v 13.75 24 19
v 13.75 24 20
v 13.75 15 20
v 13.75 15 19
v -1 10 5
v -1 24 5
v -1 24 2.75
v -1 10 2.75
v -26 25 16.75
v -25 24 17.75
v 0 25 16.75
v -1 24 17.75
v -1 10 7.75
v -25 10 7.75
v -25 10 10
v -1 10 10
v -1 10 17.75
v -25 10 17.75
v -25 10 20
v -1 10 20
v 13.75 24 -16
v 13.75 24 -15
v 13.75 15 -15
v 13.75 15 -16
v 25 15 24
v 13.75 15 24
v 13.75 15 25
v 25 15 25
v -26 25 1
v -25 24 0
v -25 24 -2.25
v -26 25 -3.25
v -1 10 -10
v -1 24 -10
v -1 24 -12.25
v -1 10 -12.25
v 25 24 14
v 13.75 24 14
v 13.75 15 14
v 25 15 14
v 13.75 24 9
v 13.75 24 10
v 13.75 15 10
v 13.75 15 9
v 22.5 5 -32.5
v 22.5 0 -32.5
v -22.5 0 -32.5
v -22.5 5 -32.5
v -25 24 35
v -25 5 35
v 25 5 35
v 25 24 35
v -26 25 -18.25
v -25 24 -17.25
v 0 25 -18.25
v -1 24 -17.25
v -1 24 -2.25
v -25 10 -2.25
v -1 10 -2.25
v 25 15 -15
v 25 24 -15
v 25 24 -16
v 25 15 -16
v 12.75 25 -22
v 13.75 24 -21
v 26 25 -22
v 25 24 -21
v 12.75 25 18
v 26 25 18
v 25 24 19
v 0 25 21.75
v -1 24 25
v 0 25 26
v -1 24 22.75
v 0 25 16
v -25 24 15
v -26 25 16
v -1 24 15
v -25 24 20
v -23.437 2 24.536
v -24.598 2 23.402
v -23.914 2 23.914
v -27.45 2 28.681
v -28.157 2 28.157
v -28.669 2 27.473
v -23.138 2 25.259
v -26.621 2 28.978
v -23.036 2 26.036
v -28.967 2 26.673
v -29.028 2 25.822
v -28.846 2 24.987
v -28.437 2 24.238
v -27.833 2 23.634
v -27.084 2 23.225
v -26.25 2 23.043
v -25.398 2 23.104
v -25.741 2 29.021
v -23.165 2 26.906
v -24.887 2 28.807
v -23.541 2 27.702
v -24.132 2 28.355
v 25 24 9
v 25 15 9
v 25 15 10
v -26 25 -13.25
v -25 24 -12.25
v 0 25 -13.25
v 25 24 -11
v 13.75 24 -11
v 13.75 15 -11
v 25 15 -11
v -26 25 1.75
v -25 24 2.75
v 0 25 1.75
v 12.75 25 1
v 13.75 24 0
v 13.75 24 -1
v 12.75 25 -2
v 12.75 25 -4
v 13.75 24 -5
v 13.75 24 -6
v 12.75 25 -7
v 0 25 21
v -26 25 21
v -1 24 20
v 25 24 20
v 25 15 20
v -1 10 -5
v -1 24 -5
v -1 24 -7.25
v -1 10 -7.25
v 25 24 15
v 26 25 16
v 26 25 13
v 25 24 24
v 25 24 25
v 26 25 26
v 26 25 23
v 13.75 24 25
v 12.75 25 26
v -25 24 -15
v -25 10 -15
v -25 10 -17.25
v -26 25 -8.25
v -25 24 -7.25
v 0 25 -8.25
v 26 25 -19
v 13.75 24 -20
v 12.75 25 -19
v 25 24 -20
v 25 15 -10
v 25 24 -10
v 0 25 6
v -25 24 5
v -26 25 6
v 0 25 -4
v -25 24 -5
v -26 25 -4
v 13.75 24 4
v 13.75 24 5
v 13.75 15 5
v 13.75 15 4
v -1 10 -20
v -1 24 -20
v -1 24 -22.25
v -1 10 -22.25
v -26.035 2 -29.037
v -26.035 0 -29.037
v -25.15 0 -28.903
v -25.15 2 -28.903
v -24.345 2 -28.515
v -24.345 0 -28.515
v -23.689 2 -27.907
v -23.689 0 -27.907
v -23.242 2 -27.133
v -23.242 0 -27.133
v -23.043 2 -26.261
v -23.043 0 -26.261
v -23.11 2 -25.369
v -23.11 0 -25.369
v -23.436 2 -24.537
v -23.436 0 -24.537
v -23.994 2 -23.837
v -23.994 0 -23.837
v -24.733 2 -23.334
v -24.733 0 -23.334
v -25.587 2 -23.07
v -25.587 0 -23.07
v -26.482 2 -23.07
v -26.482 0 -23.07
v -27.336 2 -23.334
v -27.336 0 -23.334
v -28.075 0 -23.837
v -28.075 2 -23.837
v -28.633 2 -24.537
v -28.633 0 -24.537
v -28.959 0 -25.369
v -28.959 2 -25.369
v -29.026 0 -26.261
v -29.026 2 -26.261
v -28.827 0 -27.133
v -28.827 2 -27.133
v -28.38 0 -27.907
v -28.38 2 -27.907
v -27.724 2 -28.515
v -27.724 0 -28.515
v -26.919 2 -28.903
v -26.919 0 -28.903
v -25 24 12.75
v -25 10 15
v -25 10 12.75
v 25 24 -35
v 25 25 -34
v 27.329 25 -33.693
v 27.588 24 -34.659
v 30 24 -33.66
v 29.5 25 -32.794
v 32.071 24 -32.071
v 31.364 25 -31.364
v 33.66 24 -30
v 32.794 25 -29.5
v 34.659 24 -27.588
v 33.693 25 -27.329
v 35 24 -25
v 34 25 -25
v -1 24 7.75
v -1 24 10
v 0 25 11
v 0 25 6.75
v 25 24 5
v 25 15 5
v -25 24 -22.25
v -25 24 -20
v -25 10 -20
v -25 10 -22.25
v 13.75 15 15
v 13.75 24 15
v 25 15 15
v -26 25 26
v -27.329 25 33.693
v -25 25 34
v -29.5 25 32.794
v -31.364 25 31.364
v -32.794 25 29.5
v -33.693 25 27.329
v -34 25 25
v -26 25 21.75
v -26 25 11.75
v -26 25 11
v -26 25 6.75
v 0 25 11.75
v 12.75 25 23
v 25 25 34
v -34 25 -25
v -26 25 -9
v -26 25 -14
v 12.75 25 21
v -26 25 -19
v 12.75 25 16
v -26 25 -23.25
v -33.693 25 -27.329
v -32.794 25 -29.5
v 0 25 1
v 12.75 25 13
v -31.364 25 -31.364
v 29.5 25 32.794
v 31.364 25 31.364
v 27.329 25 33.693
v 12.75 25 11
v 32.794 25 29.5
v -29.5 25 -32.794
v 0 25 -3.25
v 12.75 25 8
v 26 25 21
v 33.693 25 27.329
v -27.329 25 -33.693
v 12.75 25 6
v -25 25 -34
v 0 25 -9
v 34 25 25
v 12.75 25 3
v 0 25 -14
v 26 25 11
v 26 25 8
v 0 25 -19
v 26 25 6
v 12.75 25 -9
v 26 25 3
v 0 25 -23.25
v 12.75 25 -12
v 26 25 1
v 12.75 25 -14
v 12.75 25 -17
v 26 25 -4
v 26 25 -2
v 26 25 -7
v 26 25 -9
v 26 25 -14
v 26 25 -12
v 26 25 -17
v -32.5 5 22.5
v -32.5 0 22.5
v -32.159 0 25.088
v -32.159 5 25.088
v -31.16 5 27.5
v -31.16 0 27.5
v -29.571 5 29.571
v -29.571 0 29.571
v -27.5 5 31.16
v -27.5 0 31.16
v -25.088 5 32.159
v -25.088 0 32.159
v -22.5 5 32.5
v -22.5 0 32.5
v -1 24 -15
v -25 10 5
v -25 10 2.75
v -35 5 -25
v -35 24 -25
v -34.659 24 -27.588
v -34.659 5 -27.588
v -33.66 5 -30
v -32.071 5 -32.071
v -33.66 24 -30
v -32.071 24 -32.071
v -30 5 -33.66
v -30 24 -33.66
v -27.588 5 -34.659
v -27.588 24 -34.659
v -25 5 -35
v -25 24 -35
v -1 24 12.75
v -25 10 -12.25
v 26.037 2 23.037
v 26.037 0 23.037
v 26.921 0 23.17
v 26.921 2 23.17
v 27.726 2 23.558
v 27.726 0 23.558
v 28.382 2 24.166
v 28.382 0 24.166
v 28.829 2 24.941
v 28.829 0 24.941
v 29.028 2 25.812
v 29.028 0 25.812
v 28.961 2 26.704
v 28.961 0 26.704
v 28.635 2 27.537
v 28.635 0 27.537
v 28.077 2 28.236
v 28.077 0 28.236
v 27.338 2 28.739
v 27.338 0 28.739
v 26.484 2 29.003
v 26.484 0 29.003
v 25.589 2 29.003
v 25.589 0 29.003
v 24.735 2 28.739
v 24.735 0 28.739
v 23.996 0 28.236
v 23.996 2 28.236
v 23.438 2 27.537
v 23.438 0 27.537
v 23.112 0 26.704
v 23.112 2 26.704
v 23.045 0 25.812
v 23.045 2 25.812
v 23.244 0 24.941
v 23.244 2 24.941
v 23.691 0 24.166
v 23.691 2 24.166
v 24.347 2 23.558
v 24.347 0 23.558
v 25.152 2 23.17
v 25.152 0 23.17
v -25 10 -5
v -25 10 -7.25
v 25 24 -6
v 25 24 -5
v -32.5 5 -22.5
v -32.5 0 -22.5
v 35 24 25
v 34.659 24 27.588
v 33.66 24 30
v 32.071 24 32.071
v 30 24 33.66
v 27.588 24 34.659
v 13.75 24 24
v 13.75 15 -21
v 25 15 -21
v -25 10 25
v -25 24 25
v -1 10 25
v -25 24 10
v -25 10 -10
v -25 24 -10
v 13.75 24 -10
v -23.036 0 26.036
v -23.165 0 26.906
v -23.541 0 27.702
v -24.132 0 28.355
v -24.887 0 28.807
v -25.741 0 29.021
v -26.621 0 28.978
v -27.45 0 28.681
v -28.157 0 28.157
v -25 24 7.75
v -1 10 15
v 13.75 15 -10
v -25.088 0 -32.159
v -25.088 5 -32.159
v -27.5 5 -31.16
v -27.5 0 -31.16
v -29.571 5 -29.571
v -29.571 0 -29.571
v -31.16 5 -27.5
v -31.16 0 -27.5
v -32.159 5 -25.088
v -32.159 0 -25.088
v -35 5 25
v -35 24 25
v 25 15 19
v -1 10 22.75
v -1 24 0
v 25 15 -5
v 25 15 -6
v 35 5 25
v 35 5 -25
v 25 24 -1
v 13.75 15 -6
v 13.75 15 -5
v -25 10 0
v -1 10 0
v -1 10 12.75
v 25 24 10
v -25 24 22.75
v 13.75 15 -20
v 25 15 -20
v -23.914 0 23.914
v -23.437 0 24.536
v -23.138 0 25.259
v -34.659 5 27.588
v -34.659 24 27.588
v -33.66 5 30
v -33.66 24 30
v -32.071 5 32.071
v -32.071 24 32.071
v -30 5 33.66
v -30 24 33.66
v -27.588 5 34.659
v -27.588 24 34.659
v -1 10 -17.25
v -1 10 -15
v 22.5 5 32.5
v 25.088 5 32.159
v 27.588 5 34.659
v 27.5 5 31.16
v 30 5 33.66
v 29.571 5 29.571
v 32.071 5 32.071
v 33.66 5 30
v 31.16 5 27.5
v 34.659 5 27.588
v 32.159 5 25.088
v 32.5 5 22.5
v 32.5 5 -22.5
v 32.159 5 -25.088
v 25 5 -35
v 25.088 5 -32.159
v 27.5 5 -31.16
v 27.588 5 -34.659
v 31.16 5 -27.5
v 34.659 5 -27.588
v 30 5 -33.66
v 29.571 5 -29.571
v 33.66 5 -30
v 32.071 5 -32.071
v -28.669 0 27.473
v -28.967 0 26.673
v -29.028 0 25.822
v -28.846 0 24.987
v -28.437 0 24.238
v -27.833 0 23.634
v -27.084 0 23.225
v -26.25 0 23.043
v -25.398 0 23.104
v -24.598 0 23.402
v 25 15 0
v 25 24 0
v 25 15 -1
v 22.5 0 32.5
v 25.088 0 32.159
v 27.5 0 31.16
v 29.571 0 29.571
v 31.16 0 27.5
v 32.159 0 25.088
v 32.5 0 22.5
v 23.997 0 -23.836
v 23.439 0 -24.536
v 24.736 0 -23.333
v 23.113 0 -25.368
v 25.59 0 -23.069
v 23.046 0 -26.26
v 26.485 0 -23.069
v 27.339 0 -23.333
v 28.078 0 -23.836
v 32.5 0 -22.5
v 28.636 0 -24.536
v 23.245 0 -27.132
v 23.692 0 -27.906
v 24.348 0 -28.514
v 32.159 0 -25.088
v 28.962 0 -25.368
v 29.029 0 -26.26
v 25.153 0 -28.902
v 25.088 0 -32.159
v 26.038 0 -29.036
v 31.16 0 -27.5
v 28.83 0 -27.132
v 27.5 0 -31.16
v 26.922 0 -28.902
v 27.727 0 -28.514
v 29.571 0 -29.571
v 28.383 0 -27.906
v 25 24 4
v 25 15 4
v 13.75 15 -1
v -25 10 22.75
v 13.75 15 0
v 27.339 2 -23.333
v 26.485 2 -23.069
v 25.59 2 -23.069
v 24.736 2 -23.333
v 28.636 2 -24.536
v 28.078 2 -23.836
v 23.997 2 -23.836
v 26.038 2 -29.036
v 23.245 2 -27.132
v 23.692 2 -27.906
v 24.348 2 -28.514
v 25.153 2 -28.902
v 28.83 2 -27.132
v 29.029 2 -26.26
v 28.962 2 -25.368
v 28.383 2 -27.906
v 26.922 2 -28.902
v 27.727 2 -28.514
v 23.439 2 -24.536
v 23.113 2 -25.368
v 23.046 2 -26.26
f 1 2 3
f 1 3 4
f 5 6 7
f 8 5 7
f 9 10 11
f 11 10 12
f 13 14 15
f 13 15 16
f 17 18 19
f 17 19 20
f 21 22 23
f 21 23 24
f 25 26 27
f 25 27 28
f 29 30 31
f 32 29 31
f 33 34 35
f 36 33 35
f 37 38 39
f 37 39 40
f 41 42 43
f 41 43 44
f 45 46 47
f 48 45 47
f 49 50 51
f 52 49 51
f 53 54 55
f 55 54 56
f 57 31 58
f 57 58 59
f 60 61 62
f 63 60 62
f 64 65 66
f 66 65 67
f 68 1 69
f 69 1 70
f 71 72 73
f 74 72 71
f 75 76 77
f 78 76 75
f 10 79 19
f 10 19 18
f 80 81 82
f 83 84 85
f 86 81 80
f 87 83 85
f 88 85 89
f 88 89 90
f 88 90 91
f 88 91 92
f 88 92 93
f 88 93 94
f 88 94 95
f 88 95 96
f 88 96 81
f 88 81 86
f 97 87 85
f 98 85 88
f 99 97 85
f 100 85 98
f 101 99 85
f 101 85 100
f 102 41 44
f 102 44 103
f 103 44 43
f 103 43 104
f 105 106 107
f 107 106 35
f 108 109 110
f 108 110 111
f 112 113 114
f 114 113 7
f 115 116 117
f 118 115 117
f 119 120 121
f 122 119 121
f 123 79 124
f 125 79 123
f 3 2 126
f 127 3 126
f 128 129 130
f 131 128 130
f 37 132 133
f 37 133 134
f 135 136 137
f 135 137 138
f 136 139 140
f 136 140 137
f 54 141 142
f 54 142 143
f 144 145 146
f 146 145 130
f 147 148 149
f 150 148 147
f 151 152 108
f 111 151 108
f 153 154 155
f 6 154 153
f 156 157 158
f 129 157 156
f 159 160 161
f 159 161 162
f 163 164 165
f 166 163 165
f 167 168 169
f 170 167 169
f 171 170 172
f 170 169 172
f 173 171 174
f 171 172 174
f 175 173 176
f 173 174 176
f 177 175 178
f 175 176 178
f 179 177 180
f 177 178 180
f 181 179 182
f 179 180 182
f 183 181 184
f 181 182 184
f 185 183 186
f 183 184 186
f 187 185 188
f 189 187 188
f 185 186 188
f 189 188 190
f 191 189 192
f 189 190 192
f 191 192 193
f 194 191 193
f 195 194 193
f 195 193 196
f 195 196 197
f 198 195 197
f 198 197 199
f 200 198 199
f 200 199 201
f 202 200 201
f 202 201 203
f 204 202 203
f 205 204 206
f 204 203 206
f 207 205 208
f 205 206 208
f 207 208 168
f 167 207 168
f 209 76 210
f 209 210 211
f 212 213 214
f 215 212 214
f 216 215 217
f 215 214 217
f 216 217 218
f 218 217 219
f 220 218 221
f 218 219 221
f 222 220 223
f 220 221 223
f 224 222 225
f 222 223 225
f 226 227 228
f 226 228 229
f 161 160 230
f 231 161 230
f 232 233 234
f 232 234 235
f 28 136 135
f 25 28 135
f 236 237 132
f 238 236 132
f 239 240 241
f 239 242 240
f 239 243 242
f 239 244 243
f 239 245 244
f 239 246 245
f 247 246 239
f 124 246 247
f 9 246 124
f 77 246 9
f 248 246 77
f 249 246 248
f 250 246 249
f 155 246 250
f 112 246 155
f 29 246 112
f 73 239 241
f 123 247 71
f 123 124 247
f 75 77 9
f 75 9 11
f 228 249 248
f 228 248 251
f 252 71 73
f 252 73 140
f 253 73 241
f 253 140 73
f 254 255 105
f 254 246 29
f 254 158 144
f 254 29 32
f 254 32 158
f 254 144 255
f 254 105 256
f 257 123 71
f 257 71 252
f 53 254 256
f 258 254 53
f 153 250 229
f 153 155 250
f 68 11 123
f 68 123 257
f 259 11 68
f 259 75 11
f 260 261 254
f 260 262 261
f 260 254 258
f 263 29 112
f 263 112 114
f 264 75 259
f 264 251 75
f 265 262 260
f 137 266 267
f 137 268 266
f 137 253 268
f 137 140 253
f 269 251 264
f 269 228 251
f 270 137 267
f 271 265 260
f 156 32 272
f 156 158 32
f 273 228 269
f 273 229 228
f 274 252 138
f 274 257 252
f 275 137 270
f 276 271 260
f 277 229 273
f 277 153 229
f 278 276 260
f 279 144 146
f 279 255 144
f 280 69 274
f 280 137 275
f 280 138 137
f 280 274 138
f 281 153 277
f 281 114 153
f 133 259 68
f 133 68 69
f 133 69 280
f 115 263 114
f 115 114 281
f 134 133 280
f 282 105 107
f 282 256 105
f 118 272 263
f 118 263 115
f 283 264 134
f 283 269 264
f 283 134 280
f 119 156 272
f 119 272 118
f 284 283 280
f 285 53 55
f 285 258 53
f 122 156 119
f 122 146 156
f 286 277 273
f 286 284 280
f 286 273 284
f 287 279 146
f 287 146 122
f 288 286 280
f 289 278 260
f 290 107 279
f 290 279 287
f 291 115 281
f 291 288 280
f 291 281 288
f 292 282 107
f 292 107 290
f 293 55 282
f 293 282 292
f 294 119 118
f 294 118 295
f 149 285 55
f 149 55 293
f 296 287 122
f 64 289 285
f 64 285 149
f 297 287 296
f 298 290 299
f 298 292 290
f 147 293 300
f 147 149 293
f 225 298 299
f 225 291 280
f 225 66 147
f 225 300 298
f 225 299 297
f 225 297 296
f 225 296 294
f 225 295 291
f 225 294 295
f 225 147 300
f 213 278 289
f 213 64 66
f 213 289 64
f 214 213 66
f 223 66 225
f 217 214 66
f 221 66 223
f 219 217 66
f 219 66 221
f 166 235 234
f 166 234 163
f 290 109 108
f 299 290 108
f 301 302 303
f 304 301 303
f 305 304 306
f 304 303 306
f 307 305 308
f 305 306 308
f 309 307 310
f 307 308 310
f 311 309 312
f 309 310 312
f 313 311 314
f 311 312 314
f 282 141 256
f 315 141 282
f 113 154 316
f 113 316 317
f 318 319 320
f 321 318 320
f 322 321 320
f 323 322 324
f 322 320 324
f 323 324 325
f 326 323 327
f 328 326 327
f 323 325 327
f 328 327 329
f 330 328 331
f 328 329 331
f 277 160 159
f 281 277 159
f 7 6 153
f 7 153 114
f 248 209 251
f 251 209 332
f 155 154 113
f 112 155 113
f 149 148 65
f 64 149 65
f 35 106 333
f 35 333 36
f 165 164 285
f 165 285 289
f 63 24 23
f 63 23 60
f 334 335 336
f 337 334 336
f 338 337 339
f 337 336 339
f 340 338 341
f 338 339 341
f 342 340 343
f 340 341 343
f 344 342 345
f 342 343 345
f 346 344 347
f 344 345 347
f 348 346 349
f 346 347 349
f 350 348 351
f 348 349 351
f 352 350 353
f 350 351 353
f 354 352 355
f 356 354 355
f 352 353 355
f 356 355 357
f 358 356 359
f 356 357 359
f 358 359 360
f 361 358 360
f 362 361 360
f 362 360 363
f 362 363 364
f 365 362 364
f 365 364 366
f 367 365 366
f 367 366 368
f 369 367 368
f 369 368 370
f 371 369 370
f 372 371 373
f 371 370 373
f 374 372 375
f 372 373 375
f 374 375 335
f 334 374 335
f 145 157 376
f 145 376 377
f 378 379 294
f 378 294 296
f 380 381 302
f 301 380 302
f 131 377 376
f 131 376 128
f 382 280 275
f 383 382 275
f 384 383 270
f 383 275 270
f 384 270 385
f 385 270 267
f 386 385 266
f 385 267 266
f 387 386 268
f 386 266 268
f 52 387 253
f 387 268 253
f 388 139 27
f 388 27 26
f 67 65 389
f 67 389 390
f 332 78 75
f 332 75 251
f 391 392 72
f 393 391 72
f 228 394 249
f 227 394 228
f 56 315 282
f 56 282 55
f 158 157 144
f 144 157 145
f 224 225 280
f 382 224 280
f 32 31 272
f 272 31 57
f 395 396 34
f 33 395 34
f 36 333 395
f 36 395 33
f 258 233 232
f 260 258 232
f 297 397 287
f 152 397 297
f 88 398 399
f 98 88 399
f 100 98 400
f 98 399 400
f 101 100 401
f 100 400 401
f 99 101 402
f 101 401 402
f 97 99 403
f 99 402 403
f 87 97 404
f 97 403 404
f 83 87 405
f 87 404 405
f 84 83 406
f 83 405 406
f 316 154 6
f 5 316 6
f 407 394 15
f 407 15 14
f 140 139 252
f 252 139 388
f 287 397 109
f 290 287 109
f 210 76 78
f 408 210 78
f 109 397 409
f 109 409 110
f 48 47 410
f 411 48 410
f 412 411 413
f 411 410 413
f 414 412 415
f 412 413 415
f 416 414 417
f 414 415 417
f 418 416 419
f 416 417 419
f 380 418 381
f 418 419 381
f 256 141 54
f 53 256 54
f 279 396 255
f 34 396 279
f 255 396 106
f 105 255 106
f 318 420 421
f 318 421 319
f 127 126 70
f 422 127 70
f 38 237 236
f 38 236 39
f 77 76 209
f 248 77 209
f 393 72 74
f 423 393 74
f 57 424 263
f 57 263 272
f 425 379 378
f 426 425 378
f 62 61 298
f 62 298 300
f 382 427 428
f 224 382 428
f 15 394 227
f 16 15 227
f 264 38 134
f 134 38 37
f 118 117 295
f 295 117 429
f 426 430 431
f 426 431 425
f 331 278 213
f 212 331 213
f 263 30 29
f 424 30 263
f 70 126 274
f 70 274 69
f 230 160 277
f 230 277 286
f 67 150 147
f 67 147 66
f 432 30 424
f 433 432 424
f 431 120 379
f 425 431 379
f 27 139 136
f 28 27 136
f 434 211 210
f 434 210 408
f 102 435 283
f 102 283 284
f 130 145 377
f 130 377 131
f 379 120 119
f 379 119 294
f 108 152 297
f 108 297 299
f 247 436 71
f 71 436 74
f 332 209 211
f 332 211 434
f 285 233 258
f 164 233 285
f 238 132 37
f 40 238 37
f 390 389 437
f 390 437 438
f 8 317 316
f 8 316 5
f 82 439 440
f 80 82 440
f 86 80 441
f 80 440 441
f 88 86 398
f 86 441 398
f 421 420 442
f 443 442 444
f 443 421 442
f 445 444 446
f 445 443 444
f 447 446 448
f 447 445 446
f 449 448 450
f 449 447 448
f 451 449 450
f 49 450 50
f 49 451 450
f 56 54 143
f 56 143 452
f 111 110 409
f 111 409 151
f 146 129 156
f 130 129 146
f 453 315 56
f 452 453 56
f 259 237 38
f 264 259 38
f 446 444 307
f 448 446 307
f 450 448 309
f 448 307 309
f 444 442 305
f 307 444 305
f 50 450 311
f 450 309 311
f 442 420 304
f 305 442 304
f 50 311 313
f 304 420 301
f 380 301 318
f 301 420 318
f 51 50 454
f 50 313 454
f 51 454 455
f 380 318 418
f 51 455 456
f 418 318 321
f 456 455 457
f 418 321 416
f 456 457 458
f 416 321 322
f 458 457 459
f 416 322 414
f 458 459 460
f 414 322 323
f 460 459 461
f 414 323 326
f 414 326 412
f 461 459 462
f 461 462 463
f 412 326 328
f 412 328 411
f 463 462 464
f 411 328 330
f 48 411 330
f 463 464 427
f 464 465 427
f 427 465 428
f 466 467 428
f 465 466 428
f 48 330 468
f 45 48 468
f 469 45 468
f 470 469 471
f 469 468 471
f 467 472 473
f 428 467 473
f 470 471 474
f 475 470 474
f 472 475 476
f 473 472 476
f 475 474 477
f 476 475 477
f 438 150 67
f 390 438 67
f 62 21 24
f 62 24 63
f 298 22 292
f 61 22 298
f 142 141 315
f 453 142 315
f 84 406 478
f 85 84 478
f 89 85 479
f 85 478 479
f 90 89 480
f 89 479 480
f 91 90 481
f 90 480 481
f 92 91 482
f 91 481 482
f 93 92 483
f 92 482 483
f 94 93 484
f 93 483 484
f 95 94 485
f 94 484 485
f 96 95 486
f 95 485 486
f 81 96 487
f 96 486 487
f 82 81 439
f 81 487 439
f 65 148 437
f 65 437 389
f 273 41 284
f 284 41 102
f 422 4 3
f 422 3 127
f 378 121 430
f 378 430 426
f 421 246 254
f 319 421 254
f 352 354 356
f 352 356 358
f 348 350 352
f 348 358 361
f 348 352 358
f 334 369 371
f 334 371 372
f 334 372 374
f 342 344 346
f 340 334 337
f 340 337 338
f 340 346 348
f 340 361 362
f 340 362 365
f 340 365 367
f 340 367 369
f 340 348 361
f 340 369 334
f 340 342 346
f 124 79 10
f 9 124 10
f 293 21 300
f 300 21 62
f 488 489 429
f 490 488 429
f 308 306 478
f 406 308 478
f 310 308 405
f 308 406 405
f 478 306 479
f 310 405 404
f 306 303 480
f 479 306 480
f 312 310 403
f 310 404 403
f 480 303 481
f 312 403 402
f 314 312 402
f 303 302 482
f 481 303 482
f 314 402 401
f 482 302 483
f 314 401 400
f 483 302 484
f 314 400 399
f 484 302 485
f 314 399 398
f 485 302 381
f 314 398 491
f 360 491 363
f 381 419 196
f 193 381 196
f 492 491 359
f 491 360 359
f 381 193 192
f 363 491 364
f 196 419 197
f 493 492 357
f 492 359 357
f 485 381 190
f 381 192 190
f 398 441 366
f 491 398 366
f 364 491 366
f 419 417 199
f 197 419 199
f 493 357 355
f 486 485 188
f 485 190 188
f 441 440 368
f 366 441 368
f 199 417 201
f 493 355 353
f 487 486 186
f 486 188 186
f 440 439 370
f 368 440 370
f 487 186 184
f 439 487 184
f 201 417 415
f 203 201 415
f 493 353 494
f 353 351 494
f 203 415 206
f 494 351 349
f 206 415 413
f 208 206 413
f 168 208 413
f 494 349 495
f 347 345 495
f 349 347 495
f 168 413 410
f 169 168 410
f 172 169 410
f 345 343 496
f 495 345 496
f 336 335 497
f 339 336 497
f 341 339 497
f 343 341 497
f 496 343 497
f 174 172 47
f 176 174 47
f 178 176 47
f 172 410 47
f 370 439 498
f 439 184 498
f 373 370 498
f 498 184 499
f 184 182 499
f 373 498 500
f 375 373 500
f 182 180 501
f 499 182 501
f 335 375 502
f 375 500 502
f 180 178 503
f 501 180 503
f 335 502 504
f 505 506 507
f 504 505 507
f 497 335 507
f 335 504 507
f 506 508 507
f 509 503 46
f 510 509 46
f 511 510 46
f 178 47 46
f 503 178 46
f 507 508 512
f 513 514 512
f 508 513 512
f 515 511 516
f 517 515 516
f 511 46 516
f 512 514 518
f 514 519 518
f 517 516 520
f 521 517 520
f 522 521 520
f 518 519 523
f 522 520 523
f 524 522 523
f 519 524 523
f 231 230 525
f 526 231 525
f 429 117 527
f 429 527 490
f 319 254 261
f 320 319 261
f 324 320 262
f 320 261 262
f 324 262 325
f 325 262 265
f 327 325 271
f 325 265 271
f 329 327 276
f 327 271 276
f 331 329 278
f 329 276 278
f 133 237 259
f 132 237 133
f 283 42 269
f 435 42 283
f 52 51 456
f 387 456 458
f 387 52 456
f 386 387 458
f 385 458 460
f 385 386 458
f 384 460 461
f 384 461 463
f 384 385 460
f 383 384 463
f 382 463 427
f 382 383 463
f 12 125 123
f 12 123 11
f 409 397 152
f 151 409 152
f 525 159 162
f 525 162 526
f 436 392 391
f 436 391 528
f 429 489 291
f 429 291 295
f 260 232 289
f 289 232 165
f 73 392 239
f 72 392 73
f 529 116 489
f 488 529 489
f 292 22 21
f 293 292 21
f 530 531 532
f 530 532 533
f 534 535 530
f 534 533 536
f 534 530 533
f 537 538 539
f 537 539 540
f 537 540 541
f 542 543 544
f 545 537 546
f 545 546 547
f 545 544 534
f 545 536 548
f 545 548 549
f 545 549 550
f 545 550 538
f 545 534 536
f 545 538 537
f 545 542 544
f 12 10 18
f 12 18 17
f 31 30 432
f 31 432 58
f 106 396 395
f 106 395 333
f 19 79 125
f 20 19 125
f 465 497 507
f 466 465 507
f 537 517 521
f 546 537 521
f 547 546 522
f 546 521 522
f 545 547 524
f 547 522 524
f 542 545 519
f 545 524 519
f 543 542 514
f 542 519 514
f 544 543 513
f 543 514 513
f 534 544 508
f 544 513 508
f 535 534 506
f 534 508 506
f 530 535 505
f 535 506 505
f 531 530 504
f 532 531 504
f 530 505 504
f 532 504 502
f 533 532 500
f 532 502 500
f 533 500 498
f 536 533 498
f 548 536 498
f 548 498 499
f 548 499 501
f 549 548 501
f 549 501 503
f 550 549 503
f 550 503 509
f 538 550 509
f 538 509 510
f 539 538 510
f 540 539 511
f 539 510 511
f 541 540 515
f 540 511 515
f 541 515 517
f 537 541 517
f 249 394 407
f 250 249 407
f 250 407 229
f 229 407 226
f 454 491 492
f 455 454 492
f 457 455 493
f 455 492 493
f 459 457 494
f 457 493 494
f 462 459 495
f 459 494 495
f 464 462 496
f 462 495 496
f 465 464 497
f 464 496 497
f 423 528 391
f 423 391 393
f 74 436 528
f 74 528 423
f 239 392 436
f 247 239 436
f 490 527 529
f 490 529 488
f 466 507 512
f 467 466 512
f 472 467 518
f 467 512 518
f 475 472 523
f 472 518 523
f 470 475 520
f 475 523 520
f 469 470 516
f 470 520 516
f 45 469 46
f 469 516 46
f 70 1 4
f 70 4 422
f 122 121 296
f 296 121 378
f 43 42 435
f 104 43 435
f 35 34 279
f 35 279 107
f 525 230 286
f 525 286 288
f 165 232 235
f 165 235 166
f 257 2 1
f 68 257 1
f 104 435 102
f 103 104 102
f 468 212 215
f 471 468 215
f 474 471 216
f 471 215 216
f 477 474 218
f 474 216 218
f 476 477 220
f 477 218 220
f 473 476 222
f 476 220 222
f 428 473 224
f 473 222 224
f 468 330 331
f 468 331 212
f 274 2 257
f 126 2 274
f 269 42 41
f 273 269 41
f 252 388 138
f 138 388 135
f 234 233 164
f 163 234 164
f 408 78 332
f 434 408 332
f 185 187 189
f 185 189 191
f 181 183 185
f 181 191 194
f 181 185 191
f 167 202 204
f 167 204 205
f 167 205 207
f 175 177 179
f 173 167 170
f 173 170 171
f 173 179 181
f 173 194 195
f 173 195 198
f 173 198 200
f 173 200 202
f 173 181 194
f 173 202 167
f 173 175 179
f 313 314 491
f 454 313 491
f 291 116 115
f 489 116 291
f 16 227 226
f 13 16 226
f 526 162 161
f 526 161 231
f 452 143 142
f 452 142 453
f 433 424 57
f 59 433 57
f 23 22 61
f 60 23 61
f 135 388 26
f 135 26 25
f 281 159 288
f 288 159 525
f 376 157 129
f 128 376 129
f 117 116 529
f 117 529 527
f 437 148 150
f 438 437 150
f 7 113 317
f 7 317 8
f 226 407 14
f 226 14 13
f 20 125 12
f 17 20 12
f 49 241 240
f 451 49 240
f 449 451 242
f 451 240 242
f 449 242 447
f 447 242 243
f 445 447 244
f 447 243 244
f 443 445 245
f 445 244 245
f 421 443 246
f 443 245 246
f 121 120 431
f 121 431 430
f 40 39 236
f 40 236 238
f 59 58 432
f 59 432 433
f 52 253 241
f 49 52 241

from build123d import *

# Parameters (mm, degrees)
BOSS_EXTRUDE4_DEPTH = 5
SKETCH6_W           = 70
SKETCH6_H           = 70
BOSS_EXTRUDE5_DEPTH = 20
SKETCH8_R           = 3
CUT_EXTRUDE1_DEPTH  = 2
FILLET1_R           = 10
SKETCH9_W           = 24
SKETCH9_H           = 2.25
CUT_EXTRUDE2_DEPTH  = 15
SKETCH10_W          = 11.25
SKETCH10_H          = 1
CUT_EXTRUDE3_DEPTH  = 10
CHAMFER1_SIZE       = 1


with BuildPart() as part:
    # Sketch5 → Boss-Extrude4 (new body)
    with BuildSketch(Plane(origin=(0, 0, 0), x_dir=(1, 0, 0), z_dir=(0, 1, 0))):
        with BuildLine():
            Line((-22.5, -32.5), (22.5, -32.5))
            ThreePointArc((22.5, -32.5), (29.571067812, -29.571067812), (32.5, -22.5))
            Line((32.5, -22.5), (32.5, 22.5))
            ThreePointArc((32.5, 22.5), (29.571067812, 29.571067812), (22.5, 32.5))
            Line((22.5, 32.5), (-22.5, 32.5))
            ThreePointArc((-22.5, 32.5), (-29.571067812, 29.571067812), (-32.5, 22.5))
            Line((-32.5, 22.5), (-32.5, -22.5))
            ThreePointArc((-32.5, -22.5), (-29.571067812, -29.571067812), (-22.5, -32.5))
        make_face()
    extrude(amount=BOSS_EXTRUDE4_DEPTH)

    # Sketch6 → Boss-Extrude5 (add)
    with BuildSketch(Plane(origin=(0, 5, 0), x_dir=(1, 0, 0), z_dir=(0, 1, 0))):
        Rectangle(SKETCH6_W, SKETCH6_H)
    extrude(amount=BOSS_EXTRUDE5_DEPTH)

    # Sketch8 → Cut-Extrude1 (cut)
    with BuildSketch(Plane.XZ):
        with Locations(Location((26.037533906, -26.035533906, 0), (0, 0, 270))):
            Circle(SKETCH8_R)
        with Locations(Location((26.036533906, 26.036533906, 0), (0, 0, 270))):
            Circle(SKETCH8_R)
        with BuildLine():
            ThreePointArc((-23.035533906, 26.035533906), (-24.887483609, 28.807172503), (-28.156854249, 28.156854249))
            Line((-28.156854249, 28.156854249), (-23.914213562, 23.914213562))
            ThreePointArc((-23.914213562, 23.914213562), (-23.263895308, 24.887483609), (-23.035533906, 26.035533906))
        make_face()
        with BuildLine():
            Line((-23.914213562, 23.914213562), (-28.156854249, 28.156854249))
            ThreePointArc((-28.156854249, 28.156854249), (-28.156854249, 23.914213562), (-23.914213562, 23.914213562))
        make_face()
        with Locations(Location((-26.034533906, -26.036533906, 0), (0, 0, 270))):
            Circle(SKETCH8_R)
    extrude(amount=-CUT_EXTRUDE1_DEPTH, mode=Mode.SUBTRACT)

    # Fillet1
    fillet1_edges = [part.edges().sort_by_distance(p)[0] for p in [
        (-35, 15, -35),
        (-35, 15, 35),
        (35, 15, 35),
        (35, 15, -35),
    ]]
    fillet(fillet1_edges, radius=FILLET1_R)

    # Sketch9 → Cut-Extrude2 (cut)
    with BuildSketch(Plane(origin=(0, 25, 0), x_dir=(1, 0, 0), z_dir=(0, 1, 0))):
        with Locations((-13, -23.875)):
            Rectangle(SKETCH9_W, SKETCH9_H)
        with Locations((-13, -18.875)):
            Rectangle(SKETCH9_W, SKETCH9_H)
        with Locations((-13, -13.875)):
            Rectangle(SKETCH9_W, SKETCH9_H)
        with Locations((-13, -3.875)):
            Rectangle(SKETCH9_W, SKETCH9_H)
        with Locations((-13, 1.125)):
            Rectangle(SKETCH9_W, SKETCH9_H)
        with Locations((-13, 6.125)):
            Rectangle(SKETCH9_W, SKETCH9_H)
        with Locations((-13, 11.125)):
            Rectangle(SKETCH9_W, SKETCH9_H)
        with Locations((-13, 16.125)):
            Rectangle(SKETCH9_W, SKETCH9_H)
        with Locations((-13, 21.125)):
            Rectangle(SKETCH9_W, SKETCH9_H)
        with Locations((-13, -8.875)):
            Rectangle(SKETCH9_W, SKETCH9_H)
    extrude(amount=-CUT_EXTRUDE2_DEPTH, mode=Mode.SUBTRACT)

    # Sketch10 → Cut-Extrude3 (cut)
    with BuildSketch(Plane(origin=(0, 25, 0), x_dir=(1, 0, 0), z_dir=(0, 1, 0))):
        with Locations((19.375, -24.5)):
            Rectangle(SKETCH10_W, SKETCH10_H)
        with Locations((19.375, -19.5)):
            Rectangle(SKETCH10_W, SKETCH10_H)
        with Locations((19.375, -14.5)):
            Rectangle(SKETCH10_W, SKETCH10_H)
        with Locations((19.375, -9.5)):
            Rectangle(SKETCH10_W, SKETCH10_H)
        with Locations((19.375, 0.5)):
            Rectangle(SKETCH10_W, SKETCH10_H)
        with Locations((19.375, 5.5)):
            Rectangle(SKETCH10_W, SKETCH10_H)
        with Locations((19.375, 10.5)):
            Rectangle(SKETCH10_W, SKETCH10_H)
        with Locations((19.375, 15.5)):
            Rectangle(SKETCH10_W, SKETCH10_H)
        with Locations((19.375, 20.5)):
            Rectangle(SKETCH10_W, SKETCH10_H)
        with Locations((19.375, -4.5)):
            Rectangle(SKETCH10_W, SKETCH10_H)
    extrude(amount=-CUT_EXTRUDE3_DEPTH, mode=Mode.SUBTRACT)

    # Chamfer1
    chamfer1_edges = [part.edges().sort_by_distance(p)[0] for p in [
        (-25, 25, 23.875),
        (-13, 25, 22.75),
        (-13, 25, 25),
        (-1, 25, 23.875),
        (-25, 25, 8.875),
        (-13, 25, 7.75),
        (-13, 25, 10),
        (-1, 25, 8.875),
        (-13, 25, -22.25),
        (-25, 25, -21.125),
        (-13, 25, -20),
        (-1, 25, -21.125),
        (-13, 25, -17.25),
        (-25, 25, -16.125),
        (-13, 25, -15),
        (-1, 25, -16.125),
        (-13, 25, -12.25),
        (-25, 25, -11.125),
        (-13, 25, -10),
        (-1, 25, -11.125),
        (-13, 25, -7.25),
        (-25, 25, -6.125),
        (-13, 25, -5),
        (-1, 25, -6.125),
        (-13, 25, -2.25),
        (-25, 25, -1.125),
        (-13, 25, 0),
        (-1, 25, -1.125),
        (-13, 25, 2.75),
        (-25, 25, 3.875),
        (-13, 25, 5),
        (-1, 25, 3.875),
        (-13, 25, 12.75),
        (-25, 25, 13.875),
        (-13, 25, 15),
        (-1, 25, 13.875),
        (-13, 25, 17.75),
        (-25, 25, 18.875),
        (-13, 25, 20),
        (-1, 25, 18.875),
        (13.75, 25, 24.5),
        (25, 25, 24.5),
        (19.375, 25, 25),
        (19.375, 25, 24),
        (19.375, 25, 5),
        (13.75, 25, 4.5),
        (25, 25, 4.5),
        (19.375, 25, 4),
        (25, 25, -20.5),
        (19.375, 25, -20),
        (13.75, 25, -20.5),
        (19.375, 25, -21),
        (25, 25, -15.5),
        (19.375, 25, -15),
        (13.75, 25, -15.5),
        (19.375, 25, -16),
        (25, 25, -10.5),
        (19.375, 25, -10),
        (13.75, 25, -10.5),
        (19.375, 25, -11),
        (25, 25, -5.5),
        (19.375, 25, -5),
        (13.75, 25, -5.5),
        (19.375, 25, -6),
        (25, 25, -0.5),
        (19.375, 25, 0),
        (13.75, 25, -0.5),
        (19.375, 25, -1),
        (25, 25, 9.5),
        (19.375, 25, 10),
        (13.75, 25, 9.5),
        (19.375, 25, 9),
        (25, 25, 14.5),
        (19.375, 25, 15),
        (13.75, 25, 14.5),
        (19.375, 25, 14),
        (19.375, 25, 20),
        (13.75, 25, 19.5),
        (25, 25, 19.5),
        (19.375, 25, 19),
        (-35, 25, 0),
        (0, 25, -35),
        (0, 25, 35),
        (35, 25, 0),
        (32.071067812, 25, -32.071067812),
        (32.071067812, 25, 32.071067812),
        (-32.071067812, 25, 32.071067812),
        (-32.071067812, 25, -32.071067812),
    ]]
    chamfer(chamfer1_edges, length=CHAMFER1_SIZE)


solid = part.part
